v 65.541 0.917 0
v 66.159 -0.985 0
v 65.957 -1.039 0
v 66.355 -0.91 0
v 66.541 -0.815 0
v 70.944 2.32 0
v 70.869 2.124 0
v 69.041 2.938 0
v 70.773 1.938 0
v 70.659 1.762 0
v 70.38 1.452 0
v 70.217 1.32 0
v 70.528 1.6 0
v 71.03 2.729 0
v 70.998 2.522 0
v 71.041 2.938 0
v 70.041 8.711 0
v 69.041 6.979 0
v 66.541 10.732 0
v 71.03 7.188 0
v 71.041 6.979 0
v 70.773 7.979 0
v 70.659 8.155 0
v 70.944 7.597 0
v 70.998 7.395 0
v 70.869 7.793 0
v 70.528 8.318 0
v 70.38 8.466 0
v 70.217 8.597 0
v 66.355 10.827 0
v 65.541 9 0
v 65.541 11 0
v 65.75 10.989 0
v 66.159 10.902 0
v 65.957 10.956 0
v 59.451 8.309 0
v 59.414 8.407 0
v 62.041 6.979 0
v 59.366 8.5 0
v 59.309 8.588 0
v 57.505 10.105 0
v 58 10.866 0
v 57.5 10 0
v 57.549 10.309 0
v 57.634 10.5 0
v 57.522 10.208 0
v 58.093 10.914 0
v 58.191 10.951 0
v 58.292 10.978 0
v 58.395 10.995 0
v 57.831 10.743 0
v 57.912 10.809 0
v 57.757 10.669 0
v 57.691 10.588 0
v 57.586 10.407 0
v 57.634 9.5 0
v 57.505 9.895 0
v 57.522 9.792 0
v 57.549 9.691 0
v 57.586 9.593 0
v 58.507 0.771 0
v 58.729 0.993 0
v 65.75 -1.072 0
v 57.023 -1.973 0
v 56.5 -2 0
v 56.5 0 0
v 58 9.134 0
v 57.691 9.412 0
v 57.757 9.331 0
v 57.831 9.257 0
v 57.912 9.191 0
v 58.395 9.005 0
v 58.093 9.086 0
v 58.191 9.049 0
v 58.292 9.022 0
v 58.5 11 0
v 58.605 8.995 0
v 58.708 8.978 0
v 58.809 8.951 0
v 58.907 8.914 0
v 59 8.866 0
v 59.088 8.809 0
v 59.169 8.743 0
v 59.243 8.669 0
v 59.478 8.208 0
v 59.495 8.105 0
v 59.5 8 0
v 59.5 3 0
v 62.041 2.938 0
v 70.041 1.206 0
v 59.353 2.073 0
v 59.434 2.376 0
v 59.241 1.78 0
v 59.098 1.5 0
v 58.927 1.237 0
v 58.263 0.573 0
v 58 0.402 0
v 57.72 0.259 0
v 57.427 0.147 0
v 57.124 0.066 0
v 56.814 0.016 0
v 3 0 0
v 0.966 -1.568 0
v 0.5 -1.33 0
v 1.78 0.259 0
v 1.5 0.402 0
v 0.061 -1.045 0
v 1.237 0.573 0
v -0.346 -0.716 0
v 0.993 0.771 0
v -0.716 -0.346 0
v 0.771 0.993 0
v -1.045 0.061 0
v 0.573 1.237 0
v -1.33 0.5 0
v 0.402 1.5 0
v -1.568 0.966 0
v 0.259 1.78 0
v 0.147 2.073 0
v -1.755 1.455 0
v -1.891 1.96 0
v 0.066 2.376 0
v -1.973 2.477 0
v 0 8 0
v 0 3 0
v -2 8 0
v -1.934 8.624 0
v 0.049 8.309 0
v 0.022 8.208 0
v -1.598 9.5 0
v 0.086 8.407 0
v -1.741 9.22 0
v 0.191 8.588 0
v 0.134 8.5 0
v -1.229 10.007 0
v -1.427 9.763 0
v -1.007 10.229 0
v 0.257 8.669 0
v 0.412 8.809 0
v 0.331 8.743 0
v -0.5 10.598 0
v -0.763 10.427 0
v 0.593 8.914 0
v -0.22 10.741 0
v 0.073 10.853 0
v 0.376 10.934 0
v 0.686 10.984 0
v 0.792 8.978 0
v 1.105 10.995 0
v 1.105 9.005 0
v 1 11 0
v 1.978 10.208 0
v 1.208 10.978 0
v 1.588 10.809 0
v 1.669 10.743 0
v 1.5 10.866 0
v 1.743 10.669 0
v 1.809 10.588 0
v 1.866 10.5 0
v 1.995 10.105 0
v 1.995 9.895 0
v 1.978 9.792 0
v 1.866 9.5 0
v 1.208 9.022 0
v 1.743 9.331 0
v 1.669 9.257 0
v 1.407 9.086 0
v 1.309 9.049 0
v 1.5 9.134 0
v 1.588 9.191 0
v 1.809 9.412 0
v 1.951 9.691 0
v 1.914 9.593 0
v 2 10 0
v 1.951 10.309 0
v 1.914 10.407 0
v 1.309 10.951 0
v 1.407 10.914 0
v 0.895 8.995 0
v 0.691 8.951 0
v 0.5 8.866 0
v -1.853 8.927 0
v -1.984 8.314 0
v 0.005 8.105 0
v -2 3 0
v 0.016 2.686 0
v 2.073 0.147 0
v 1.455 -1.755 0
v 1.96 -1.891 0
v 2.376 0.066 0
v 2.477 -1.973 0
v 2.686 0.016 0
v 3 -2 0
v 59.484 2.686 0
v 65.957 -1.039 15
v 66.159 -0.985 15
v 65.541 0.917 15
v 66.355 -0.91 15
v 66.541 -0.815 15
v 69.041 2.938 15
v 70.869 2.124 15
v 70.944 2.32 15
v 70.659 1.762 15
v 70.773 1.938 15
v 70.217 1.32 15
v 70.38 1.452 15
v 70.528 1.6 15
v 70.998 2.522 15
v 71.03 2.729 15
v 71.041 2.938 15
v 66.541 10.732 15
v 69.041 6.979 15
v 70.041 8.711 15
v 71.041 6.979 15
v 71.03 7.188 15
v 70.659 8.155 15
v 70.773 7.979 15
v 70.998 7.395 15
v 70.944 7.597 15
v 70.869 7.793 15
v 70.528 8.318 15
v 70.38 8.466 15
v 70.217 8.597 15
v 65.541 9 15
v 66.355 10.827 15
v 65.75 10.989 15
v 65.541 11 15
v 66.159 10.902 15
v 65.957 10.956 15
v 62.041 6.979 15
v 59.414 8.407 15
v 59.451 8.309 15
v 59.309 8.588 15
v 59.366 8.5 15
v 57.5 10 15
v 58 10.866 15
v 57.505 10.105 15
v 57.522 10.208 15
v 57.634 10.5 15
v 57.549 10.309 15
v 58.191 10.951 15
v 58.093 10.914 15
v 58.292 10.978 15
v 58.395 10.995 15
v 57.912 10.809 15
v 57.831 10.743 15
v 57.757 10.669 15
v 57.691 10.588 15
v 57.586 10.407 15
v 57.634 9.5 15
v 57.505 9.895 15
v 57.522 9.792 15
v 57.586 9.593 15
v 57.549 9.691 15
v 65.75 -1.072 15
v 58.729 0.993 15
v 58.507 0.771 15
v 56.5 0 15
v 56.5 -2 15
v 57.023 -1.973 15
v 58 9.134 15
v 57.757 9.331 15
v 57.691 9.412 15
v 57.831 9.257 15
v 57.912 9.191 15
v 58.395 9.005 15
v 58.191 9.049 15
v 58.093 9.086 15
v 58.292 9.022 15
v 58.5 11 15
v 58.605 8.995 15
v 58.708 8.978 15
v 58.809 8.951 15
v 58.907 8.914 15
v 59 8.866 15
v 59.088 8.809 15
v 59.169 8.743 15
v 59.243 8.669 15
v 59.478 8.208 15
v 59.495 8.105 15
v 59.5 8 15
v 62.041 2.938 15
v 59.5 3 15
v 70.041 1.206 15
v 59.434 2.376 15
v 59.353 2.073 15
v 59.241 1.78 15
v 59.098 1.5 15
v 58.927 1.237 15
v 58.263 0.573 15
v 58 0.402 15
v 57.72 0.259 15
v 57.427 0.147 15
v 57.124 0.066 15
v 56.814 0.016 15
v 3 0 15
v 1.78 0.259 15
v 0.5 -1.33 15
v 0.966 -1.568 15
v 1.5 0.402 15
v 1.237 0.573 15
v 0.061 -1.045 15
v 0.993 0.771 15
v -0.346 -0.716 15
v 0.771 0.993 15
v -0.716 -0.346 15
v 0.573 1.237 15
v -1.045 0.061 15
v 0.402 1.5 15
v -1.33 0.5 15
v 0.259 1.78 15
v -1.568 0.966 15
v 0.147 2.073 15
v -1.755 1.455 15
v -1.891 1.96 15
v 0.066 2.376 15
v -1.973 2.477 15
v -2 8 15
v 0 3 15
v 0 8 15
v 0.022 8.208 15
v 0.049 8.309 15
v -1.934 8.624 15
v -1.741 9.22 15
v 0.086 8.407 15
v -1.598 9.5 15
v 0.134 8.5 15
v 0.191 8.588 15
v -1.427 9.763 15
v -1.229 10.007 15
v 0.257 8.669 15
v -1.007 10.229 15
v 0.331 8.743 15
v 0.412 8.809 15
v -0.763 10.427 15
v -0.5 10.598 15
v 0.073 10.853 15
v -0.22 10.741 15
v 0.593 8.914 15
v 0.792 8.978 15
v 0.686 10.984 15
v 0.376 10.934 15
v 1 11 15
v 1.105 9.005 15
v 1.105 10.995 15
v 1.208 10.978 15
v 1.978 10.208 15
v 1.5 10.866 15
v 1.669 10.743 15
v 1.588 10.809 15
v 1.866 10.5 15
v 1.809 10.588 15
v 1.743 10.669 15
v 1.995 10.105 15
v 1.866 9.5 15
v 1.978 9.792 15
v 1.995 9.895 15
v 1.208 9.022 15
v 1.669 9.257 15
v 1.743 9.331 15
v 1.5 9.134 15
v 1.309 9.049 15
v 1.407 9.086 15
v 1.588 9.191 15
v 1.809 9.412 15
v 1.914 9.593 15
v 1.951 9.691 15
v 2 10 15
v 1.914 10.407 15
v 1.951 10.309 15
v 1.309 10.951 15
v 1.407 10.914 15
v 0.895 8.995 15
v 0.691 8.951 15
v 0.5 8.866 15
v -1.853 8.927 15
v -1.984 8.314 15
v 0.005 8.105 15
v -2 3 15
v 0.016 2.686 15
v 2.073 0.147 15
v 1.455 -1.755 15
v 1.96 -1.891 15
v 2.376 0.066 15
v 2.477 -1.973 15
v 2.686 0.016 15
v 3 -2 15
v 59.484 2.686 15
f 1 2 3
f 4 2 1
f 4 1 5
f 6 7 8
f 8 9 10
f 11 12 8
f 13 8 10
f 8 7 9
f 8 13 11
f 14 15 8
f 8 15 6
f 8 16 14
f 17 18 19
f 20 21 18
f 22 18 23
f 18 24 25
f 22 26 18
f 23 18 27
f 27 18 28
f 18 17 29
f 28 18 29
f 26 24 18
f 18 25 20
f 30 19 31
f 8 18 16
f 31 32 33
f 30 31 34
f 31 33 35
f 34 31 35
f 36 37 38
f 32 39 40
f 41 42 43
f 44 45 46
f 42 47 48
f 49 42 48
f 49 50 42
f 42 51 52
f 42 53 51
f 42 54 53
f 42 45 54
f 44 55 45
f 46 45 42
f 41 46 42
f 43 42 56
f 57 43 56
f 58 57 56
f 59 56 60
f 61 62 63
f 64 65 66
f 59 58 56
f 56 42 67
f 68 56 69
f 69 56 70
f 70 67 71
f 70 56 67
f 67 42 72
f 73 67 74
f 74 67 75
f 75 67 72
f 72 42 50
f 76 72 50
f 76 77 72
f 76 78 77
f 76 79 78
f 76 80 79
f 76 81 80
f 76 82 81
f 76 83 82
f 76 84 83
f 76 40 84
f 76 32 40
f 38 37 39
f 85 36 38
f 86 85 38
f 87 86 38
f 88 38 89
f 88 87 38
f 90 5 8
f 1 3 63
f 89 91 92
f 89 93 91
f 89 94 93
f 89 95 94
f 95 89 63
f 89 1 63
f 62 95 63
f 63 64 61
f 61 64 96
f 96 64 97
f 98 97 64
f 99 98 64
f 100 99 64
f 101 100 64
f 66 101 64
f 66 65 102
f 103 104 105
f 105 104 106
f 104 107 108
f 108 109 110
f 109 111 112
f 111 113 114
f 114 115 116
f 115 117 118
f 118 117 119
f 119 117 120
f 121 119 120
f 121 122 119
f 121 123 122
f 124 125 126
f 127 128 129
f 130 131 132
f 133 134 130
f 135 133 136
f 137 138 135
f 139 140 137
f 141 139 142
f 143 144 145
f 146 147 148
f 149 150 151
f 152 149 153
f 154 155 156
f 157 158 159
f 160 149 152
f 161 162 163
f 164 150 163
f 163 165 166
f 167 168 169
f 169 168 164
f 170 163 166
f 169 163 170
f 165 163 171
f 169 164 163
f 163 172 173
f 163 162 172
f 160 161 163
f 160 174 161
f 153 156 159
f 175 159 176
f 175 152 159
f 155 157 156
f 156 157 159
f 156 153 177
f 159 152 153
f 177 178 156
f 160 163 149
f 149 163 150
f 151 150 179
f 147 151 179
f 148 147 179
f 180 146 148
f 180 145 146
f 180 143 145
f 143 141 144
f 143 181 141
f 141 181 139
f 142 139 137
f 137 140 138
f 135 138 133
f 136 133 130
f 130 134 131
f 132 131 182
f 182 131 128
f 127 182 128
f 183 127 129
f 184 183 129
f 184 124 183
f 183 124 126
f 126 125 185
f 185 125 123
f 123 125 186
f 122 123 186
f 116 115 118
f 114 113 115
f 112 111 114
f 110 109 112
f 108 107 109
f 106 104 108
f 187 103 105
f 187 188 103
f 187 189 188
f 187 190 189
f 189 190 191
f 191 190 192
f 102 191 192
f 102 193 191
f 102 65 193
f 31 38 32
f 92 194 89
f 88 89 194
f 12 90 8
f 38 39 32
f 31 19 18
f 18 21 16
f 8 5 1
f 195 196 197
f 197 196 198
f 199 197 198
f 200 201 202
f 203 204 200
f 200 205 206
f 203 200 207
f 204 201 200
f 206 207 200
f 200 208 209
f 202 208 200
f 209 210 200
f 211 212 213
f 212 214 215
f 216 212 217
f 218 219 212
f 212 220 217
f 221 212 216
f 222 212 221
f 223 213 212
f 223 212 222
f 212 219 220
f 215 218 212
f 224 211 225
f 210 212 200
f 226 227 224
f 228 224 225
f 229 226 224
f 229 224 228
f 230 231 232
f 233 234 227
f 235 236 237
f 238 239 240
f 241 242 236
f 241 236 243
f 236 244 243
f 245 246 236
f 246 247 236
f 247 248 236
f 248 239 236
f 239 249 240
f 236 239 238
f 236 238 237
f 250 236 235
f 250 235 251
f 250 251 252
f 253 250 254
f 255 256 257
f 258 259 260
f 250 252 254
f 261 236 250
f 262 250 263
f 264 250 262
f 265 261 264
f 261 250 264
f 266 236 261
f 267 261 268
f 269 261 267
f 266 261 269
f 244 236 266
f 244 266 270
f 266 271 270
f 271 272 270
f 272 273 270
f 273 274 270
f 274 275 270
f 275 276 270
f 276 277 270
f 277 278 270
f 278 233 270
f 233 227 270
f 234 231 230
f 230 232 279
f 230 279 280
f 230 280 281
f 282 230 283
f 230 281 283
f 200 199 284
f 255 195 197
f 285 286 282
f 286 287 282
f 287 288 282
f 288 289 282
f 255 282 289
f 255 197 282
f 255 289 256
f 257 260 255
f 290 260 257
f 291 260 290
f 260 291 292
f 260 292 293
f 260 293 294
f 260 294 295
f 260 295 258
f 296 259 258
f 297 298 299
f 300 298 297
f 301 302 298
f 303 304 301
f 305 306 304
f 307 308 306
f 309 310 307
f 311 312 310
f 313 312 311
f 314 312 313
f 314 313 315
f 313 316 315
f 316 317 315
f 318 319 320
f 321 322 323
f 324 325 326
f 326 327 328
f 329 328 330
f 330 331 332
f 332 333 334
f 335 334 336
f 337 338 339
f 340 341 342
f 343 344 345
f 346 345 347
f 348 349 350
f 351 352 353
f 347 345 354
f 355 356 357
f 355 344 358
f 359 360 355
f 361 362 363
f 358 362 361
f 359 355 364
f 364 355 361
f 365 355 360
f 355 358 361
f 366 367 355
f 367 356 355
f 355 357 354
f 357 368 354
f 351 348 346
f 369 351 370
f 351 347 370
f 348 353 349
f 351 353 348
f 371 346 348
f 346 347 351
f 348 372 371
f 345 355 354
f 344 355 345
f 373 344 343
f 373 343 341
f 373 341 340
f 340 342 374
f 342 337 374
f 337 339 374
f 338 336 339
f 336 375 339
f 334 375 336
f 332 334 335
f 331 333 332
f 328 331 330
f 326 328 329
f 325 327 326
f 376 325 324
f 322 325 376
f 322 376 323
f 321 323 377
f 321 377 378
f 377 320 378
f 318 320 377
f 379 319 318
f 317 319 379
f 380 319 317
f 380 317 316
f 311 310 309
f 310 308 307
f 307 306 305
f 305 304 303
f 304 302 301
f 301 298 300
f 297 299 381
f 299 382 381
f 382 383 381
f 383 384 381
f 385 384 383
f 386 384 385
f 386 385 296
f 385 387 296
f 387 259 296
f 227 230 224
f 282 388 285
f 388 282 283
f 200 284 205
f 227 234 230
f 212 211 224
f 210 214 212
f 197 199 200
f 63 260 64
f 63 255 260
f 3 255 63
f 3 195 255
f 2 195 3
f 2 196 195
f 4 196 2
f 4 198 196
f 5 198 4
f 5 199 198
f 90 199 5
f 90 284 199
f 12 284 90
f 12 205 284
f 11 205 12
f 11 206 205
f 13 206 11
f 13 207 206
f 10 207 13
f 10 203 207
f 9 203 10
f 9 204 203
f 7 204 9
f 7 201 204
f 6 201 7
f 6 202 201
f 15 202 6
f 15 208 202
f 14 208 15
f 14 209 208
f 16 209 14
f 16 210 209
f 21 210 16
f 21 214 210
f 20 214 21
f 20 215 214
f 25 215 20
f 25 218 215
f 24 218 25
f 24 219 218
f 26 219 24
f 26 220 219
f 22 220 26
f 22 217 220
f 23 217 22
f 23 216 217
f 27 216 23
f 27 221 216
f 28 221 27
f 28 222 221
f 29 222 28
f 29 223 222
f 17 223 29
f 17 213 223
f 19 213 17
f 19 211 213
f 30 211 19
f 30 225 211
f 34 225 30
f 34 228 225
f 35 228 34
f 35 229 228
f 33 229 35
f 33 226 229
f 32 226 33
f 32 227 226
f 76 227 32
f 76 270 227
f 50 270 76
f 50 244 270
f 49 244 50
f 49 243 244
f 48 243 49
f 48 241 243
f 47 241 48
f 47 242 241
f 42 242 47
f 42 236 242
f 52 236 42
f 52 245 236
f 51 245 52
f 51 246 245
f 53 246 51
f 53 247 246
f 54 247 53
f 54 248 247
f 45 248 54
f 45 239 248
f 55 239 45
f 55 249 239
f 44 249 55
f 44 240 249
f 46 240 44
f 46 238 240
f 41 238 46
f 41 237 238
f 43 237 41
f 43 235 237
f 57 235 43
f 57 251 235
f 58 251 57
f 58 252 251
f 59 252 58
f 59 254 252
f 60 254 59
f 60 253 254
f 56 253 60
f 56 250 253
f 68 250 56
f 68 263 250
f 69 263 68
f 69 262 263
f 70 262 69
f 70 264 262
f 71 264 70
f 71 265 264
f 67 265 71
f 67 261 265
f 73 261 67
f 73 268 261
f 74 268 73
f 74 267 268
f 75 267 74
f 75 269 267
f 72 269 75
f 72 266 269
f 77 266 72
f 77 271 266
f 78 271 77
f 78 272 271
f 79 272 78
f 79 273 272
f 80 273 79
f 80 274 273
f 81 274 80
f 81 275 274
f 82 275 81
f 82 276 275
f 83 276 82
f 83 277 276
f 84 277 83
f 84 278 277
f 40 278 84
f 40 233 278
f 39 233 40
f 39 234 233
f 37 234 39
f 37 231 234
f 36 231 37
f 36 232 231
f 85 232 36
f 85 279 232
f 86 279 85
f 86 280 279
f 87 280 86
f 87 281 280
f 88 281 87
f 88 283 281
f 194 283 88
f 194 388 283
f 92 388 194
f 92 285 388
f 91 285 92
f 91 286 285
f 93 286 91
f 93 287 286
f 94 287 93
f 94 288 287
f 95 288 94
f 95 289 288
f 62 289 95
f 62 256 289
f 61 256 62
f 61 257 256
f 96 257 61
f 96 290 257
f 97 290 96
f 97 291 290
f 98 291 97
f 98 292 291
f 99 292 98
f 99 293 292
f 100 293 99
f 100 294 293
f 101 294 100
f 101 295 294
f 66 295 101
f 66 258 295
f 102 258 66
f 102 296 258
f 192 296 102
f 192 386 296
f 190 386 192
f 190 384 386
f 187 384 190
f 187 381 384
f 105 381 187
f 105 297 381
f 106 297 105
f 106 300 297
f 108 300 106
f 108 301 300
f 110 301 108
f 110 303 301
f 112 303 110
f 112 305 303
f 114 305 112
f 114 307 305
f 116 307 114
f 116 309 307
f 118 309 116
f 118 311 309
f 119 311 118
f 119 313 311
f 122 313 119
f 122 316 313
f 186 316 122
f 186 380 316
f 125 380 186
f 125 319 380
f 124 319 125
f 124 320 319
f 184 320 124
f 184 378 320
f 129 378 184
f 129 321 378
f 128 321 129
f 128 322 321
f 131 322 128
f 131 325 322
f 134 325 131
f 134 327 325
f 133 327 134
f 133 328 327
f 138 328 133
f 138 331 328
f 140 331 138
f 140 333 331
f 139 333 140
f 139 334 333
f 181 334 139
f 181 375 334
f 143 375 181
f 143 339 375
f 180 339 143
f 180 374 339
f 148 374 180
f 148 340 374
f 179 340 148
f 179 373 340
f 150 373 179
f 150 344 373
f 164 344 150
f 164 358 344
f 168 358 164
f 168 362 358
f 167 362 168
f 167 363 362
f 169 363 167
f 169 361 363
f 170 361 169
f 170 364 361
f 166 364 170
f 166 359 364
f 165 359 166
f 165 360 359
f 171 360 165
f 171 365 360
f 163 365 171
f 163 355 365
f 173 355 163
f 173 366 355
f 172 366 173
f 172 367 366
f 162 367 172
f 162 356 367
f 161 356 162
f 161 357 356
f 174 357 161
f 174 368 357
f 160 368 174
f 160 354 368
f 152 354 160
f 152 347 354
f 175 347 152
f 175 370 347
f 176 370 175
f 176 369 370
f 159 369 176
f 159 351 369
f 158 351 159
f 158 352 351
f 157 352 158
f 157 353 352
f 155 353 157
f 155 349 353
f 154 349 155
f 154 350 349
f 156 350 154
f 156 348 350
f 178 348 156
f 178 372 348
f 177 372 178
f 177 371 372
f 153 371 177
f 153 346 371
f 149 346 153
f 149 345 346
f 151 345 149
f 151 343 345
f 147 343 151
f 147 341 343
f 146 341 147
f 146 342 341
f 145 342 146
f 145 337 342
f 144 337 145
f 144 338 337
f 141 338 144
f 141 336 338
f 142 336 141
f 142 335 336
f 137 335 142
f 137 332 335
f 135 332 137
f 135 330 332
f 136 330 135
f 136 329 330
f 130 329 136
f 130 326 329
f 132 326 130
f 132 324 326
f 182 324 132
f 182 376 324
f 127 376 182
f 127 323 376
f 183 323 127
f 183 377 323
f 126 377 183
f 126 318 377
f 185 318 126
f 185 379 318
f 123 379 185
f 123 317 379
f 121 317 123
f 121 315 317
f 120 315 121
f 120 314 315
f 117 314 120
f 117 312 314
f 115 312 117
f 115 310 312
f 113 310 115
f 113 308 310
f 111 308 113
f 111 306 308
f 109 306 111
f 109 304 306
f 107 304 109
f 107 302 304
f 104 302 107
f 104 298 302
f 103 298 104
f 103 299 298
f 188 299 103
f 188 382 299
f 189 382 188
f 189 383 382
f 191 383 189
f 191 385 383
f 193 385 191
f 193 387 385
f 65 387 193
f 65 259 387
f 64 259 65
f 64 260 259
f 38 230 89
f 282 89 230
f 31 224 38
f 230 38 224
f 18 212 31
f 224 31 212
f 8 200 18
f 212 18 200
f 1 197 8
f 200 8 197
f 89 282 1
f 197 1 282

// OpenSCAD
// Customizable Phone Pencil Clip
// preview[view:south, tilt:top];

use <MCAD/regular_shapes.scad>;

/* [Phone] */

phone_width = 59.5;

phone_thickness = 9;

// Radius of phone cross section curvature from sides to face. Set to 0 for square corners.
phone_face_radius = 1;

// Radius of phone cross section curvature from sides to back. Set to 0 for square corners.
phone_back_radius = 3;

/* [Pencil] */

// Determines shape of pencil socket in clip.
pencil_shape = 6; // [0:Circular, 6:Hexagonal]

// For hexagonal pencils, measure the diameter from flat side to side, not from corner to corner. 
pencil_diameter = 7;

// Adjust orientation of pencil socket. Doesn't really matter for circular pencils.
pencil_rotation = 30; // [0:360]

/* [Clip] */

// Width of clip grips on front face of phone, not counting rounded ends. Recommended values >= phone face radius.
clip_inset = 1;

// Minimum thickness of clip walls, including separation between phone and pencil socket.
clip_walls = 2;

// Alternatively, just scale Z dimension to desired height in your print software.
clip_height = 15;

/* [Hidden] */

$fn = 60;

// radius from apothem (distance from center to midpoint of reg polygon flat sides)
function rfa(sides, apothem) = apothem / cos(180 / sides);

pencil_radius = (pencil_shape == 0 ? pencil_diameter / 2 : rfa(pencil_shape, pencil_diameter / 2));

linear_extrude(height=clip_height) Clip();

module Clip() {

	union() {

		// 4. Subtract part holes and clip face opening from clip outline.
		difference() {
		
			// 3. ...and roll it around the parts outline to inflate it to clip outline
			minkowski() {
				
				// 2. We take a circle with radius equal to clip thickness...
				circle(r=clip_walls);
				
				// 1. The convex hull of Parts is the smallest shape containing
				//    both the phone and pencil holder within its outline.
				hull() Parts();
			}
			
			union() Parts();
			Face();
		}

		// only add round nubbins if inset > front_radius)
		if (clip_inset >= phone_face_radius) {
			translate([clip_inset, phone_thickness + (clip_walls/2), 0]) circle(r=clip_walls/2);
			translate([phone_width - clip_inset, phone_thickness + (clip_walls/2), 0]) circle(r=clip_walls/2);
		}
	}
}

module Face() {
	// triple height face to ensure clean cut through front of clip
	translate([clip_inset, phone_thickness - clip_walls, 0])
	square([phone_width - (clip_inset * 2), clip_walls * 3]);
}

// Phone and holder cross sections positioned together
module Parts() {
	Phone();

	translate([phone_width + pencil_radius + clip_walls, phone_thickness - pencil_radius, 0]) Holder();
}

module Phone() {
	// Convex hull of the corners is the shape of the phone cross section
	hull() {

		// Corners from sides to front face
		if (phone_face_radius == 0) {
			translate([0, phone_thickness-1, 0]) square(1);
			translate([phone_width-1, phone_thickness-1, 0]) square(1);
		}
		else {
			translate([phone_face_radius, phone_thickness-phone_face_radius, 0]) circle(r = phone_face_radius);
			translate([phone_width-phone_face_radius, phone_thickness-phone_face_radius, 0]) circle(r=phone_face_radius);
		}
		
		// Corners from back surface to sides
		if (phone_back_radius == 0) {
			translate([0, 0, 0]) square(1);
			translate([phone_width-1, 0, 0]) square(1);
		}
		else {
			translate([phone_width-phone_back_radius, phone_back_radius, 0]) circle(r=phone_back_radius);
			translate([phone_back_radius, phone_back_radius, 0]) circle(r=phone_back_radius);
		}
	}
}

module Holder() {
	if (pencil_shape == 0) {
		circle(r=pencil_radius);
	}
	else {
		// circle(r=pencil_radius, $fn=pencil_shape) will work as a vanilla way to make a reg_polygon.
		rotate([0, 0, pencil_rotation]) reg_polygon(sides=pencil_shape, radius=pencil_radius);
	}
}
